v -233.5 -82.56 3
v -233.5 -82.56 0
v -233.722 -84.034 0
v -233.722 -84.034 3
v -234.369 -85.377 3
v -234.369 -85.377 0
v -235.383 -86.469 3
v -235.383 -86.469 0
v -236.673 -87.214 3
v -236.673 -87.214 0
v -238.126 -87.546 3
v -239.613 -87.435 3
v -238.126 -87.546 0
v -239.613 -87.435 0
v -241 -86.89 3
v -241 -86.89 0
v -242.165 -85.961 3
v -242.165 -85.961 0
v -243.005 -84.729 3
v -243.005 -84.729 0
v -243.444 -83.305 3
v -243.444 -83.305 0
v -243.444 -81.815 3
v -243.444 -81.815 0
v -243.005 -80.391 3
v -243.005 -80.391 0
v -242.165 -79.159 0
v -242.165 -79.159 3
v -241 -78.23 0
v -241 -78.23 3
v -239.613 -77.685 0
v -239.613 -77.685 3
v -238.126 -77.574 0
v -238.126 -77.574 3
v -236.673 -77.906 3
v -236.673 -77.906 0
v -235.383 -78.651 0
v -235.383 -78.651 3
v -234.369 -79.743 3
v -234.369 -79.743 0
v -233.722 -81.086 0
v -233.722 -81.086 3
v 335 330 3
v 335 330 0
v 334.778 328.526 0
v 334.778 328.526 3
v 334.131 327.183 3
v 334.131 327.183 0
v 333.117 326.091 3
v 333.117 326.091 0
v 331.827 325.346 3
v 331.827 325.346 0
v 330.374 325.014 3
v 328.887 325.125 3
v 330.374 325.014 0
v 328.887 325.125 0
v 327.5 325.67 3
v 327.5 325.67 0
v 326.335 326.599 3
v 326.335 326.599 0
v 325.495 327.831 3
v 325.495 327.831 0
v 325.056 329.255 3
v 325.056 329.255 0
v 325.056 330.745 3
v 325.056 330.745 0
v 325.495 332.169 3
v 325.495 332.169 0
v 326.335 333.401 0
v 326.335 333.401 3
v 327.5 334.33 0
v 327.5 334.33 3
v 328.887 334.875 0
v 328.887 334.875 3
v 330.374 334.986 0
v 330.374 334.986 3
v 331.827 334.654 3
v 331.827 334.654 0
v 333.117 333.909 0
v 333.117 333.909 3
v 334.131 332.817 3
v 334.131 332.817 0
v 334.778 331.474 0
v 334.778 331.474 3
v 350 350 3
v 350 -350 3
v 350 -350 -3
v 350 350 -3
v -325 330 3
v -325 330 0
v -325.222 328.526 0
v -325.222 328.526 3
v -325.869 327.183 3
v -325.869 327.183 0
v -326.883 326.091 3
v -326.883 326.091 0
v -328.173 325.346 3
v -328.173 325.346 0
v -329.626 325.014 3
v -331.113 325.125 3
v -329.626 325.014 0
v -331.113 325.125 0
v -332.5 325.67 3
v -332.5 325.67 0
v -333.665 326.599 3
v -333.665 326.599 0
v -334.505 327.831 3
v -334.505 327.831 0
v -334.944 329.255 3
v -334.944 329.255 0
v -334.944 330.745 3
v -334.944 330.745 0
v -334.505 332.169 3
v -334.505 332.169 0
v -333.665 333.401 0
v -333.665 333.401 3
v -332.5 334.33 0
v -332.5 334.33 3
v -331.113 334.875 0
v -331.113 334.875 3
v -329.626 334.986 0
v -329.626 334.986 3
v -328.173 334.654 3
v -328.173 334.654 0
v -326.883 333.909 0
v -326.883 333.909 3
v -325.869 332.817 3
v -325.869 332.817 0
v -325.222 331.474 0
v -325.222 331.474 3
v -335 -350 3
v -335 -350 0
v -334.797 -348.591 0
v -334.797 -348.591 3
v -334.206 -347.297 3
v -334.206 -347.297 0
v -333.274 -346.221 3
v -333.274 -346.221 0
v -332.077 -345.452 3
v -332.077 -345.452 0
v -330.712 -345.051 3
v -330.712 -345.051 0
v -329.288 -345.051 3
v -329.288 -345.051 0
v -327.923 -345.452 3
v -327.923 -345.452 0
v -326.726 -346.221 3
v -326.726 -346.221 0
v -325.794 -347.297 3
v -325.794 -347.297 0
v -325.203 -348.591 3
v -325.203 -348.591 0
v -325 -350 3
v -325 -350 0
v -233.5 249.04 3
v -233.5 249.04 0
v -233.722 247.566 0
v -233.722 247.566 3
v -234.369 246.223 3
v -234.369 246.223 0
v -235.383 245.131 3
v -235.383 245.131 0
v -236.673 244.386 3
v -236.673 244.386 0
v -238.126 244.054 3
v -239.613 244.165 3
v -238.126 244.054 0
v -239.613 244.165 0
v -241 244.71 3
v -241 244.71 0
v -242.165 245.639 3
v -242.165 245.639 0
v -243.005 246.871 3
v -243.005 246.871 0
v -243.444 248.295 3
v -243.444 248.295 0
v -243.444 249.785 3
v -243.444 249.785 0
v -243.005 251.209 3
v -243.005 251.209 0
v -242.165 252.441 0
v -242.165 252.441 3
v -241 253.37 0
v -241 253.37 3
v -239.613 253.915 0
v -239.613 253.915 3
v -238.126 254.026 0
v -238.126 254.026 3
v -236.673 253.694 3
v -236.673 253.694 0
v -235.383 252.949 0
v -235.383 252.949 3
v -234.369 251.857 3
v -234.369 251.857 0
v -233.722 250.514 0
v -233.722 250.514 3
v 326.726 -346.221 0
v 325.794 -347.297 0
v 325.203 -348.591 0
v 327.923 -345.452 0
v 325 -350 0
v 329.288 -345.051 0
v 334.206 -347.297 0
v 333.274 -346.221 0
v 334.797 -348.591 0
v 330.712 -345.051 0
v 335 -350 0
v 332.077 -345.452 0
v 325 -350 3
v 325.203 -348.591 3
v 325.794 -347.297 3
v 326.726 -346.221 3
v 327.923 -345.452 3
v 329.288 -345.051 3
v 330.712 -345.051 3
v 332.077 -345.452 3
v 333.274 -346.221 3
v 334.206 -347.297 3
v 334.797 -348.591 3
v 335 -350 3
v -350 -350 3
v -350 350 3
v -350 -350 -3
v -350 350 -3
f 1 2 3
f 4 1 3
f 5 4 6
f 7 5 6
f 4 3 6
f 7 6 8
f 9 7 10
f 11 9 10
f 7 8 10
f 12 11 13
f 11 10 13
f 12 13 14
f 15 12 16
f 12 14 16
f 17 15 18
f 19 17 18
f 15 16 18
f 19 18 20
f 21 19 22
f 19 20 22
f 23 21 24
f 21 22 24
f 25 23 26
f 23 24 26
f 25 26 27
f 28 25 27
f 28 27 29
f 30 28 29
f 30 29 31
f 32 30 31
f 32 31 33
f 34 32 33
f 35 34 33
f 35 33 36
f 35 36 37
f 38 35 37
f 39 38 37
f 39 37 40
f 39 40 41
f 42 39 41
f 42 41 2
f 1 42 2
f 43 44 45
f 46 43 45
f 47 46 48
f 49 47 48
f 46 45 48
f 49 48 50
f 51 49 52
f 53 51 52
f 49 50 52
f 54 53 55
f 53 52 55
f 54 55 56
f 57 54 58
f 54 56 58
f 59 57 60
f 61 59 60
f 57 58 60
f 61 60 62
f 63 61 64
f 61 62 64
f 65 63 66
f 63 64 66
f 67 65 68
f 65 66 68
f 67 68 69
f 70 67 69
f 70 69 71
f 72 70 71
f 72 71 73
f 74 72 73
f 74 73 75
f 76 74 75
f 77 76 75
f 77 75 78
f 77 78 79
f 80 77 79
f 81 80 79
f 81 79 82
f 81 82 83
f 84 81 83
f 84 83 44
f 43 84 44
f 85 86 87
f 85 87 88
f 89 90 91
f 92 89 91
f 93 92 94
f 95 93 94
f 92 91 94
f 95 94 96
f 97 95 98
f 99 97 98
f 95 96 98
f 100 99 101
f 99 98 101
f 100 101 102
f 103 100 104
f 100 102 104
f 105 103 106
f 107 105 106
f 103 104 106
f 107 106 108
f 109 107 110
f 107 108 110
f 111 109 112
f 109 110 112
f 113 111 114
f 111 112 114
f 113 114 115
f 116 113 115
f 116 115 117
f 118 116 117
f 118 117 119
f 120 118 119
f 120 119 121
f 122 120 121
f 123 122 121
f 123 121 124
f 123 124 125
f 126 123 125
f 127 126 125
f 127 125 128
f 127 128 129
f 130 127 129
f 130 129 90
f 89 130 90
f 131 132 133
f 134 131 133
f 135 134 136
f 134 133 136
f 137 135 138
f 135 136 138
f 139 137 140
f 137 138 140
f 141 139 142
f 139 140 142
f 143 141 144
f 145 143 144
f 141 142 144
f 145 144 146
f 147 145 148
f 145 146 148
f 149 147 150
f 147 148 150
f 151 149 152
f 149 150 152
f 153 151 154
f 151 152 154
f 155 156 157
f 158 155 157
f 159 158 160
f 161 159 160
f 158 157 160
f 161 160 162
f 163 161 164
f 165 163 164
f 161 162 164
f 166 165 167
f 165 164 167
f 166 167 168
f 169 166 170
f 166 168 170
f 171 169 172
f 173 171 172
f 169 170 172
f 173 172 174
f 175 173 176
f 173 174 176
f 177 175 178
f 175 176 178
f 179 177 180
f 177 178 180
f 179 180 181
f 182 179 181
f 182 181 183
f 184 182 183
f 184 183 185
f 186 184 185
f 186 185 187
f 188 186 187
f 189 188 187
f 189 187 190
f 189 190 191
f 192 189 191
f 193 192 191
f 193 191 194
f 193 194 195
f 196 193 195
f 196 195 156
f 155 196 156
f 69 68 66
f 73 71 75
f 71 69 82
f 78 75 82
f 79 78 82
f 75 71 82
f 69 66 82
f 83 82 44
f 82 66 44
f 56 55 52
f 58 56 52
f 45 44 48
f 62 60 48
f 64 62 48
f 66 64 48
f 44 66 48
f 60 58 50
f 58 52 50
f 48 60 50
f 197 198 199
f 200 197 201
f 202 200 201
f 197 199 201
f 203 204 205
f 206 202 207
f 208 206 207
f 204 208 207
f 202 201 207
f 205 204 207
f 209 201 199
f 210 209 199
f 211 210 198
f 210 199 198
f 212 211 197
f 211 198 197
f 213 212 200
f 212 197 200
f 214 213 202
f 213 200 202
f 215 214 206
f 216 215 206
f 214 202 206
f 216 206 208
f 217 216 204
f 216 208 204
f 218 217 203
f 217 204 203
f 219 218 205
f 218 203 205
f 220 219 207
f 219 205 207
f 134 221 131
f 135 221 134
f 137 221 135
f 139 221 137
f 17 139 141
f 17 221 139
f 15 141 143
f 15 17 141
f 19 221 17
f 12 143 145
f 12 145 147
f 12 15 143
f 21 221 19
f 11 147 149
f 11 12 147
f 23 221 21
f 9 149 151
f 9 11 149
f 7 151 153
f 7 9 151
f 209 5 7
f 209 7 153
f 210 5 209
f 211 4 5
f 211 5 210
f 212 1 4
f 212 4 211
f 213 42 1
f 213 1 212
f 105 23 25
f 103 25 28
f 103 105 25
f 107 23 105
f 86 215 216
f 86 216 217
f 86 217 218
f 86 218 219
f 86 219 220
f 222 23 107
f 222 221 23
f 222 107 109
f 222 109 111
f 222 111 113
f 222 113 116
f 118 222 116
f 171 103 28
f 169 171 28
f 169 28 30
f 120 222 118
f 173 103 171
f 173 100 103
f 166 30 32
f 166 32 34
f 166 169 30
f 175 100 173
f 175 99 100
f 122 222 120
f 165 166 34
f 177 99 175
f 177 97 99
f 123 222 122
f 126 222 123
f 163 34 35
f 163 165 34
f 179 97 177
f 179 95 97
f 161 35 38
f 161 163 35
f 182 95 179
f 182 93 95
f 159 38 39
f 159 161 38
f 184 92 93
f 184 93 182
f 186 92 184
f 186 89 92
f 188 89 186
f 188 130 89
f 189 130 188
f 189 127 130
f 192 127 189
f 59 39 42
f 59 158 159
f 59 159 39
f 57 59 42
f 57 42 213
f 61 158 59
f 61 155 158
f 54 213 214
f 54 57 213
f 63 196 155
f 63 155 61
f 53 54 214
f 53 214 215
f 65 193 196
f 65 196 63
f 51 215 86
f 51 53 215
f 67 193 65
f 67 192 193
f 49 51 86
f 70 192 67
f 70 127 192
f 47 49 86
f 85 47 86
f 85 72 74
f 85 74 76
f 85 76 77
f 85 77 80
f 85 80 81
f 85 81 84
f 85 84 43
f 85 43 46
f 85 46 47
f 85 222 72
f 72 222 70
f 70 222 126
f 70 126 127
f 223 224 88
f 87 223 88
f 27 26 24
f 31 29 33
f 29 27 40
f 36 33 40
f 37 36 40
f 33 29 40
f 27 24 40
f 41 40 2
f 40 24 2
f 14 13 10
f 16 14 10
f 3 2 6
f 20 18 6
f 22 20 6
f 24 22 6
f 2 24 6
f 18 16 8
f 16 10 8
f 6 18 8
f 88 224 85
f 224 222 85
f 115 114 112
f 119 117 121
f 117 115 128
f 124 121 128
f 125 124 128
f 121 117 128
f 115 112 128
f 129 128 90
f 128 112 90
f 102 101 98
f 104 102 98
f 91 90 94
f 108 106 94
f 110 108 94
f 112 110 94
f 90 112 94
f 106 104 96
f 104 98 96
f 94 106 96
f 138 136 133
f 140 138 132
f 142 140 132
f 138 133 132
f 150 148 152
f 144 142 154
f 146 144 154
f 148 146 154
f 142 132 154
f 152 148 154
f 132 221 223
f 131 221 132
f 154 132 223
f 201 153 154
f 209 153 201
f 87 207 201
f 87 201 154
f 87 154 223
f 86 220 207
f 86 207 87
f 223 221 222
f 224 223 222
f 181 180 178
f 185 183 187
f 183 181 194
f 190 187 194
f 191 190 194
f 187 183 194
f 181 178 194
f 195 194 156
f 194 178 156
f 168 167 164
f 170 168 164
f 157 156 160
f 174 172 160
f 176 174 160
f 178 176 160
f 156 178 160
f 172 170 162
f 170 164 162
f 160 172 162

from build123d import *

# Parameters (mm, degrees)
F0_W     = 700
F0_H     = 700
F1_DEPTH = 3
F2_D     = 10
F2_DEPTH = 3.001


with BuildPart() as f1:
    # F0 (on Top) → F1 (new body, symmetric)
    with BuildSketch(Plane.XY):
        Rectangle(F0_W, F0_H)
    extrude(amount=F1_DEPTH, both=True)

    # F2 (through all, one way)
    with BuildSketch(Plane(origin=(0, 0, 0), x_dir=(1, 0, 0), z_dir=(0, 0, -1))):
        with Locations((-330, -330), (330, -330), (330, 350), (-330, 350), (-238.5, -249.04), (-238.5, 82.56)):
            Circle(F2_D / 2)
    extrude(amount=-F2_DEPTH, mode=Mode.SUBTRACT)


solid = f1.part
